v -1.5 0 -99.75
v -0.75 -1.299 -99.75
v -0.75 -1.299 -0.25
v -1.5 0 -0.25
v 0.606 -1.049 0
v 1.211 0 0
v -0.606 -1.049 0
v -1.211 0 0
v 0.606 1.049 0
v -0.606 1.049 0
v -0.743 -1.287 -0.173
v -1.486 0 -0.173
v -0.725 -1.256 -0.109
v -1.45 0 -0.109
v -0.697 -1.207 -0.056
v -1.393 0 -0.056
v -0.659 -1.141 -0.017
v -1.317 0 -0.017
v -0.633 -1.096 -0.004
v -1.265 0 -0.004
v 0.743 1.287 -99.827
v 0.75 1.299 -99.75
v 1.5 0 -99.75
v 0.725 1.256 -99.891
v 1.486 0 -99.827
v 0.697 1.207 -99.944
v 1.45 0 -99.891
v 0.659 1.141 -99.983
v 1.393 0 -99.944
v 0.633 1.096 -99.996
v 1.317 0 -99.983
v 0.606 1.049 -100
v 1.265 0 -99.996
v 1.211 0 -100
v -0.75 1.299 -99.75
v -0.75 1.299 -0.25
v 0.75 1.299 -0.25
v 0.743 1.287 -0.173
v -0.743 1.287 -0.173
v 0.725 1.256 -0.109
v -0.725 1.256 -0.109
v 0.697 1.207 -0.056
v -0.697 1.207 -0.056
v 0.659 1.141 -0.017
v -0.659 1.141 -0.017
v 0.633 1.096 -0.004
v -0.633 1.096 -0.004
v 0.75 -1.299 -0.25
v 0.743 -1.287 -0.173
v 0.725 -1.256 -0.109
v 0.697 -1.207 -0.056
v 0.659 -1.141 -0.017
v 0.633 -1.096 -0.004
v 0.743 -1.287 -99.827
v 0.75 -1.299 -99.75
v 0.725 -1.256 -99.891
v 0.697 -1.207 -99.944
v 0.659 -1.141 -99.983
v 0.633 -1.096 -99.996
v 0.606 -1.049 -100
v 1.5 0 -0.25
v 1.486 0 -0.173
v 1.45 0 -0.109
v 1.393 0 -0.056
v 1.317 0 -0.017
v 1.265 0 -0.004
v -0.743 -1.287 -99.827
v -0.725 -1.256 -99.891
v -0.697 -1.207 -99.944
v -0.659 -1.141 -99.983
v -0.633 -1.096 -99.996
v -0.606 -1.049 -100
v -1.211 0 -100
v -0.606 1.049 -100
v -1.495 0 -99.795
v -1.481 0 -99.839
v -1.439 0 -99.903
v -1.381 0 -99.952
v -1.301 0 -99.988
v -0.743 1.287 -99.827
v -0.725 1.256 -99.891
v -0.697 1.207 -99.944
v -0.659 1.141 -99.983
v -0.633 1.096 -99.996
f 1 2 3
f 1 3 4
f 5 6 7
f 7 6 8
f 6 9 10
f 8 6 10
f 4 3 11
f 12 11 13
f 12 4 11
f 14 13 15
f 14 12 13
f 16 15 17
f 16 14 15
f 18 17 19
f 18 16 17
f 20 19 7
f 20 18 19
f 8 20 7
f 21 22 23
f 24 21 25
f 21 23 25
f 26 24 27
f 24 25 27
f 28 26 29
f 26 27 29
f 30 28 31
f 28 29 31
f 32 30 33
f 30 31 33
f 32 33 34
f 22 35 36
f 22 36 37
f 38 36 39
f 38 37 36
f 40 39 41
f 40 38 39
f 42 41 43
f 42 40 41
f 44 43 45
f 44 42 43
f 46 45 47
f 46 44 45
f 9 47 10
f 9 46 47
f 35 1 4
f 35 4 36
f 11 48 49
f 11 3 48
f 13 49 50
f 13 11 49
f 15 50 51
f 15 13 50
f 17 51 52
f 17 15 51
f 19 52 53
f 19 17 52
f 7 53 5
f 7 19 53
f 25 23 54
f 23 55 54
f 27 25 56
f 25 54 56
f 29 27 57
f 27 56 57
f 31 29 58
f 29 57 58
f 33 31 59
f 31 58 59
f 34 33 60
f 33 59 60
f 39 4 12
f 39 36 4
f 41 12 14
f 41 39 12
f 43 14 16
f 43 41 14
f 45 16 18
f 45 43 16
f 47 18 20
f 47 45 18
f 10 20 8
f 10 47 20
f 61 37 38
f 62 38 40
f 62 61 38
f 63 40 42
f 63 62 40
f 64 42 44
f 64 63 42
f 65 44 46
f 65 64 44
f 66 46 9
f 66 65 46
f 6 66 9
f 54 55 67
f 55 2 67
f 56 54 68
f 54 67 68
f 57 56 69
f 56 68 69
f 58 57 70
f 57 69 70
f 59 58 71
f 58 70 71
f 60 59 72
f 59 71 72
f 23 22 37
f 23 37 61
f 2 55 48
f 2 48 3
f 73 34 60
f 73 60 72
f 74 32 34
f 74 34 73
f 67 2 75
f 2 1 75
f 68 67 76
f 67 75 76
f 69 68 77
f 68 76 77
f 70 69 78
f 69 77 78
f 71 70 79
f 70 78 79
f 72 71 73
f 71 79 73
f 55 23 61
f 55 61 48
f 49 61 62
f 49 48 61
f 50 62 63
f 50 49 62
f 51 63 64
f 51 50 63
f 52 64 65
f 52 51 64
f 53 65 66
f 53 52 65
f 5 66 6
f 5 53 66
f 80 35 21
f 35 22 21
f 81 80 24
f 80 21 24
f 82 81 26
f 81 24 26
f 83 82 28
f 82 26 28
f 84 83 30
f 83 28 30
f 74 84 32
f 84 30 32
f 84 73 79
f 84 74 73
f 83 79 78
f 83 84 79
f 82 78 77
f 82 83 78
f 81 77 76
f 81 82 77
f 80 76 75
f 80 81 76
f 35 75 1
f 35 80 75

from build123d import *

# Parameters (mm, degrees)
RESSALTO_EXTRUS_O1_DEPTH = 50
FILETE1_R                = 0.25


with BuildPart() as part:
    # Esboço1 → Ressalto-extrusão1 (new, symmetric)
    with BuildSketch(Plane(origin=(0, 0, -50), x_dir=(-1, 0, 0), z_dir=(0, 0, -1))):
        Polygon((0.75, -1.299038106), (1.5, 0), (0.75, 1.299038106), (-0.75, 1.299038106), (-1.5, 0), (-0.75, -1.299038106), align=None)
    extrude(amount=RESSALTO_EXTRUS_O1_DEPTH, both=True)

    # Filete1
    filete1_edges = [part.edges().sort_by_distance(p)[0] for p in [
        (-1.125, 0.649519053, 0),
        (0, 1.299038106, 0),
        (1.125, 0.649519053, 0),
        (1.125, -0.649519053, 0),
        (0, -1.299038106, 0),
        (1.125, -0.649519053, -100),
        (1.125, 0.649519053, -100),
        (0, 1.299038106, -100),
        (-1.125, -0.649519053, 0),
        (-1.125, 0.649519053, -100),
        (-1.125, -0.649519053, -100),
        (0, -1.299038106, -100),
    ]]
    fillet(filete1_edges, radius=FILETE1_R)


solid = part.part
